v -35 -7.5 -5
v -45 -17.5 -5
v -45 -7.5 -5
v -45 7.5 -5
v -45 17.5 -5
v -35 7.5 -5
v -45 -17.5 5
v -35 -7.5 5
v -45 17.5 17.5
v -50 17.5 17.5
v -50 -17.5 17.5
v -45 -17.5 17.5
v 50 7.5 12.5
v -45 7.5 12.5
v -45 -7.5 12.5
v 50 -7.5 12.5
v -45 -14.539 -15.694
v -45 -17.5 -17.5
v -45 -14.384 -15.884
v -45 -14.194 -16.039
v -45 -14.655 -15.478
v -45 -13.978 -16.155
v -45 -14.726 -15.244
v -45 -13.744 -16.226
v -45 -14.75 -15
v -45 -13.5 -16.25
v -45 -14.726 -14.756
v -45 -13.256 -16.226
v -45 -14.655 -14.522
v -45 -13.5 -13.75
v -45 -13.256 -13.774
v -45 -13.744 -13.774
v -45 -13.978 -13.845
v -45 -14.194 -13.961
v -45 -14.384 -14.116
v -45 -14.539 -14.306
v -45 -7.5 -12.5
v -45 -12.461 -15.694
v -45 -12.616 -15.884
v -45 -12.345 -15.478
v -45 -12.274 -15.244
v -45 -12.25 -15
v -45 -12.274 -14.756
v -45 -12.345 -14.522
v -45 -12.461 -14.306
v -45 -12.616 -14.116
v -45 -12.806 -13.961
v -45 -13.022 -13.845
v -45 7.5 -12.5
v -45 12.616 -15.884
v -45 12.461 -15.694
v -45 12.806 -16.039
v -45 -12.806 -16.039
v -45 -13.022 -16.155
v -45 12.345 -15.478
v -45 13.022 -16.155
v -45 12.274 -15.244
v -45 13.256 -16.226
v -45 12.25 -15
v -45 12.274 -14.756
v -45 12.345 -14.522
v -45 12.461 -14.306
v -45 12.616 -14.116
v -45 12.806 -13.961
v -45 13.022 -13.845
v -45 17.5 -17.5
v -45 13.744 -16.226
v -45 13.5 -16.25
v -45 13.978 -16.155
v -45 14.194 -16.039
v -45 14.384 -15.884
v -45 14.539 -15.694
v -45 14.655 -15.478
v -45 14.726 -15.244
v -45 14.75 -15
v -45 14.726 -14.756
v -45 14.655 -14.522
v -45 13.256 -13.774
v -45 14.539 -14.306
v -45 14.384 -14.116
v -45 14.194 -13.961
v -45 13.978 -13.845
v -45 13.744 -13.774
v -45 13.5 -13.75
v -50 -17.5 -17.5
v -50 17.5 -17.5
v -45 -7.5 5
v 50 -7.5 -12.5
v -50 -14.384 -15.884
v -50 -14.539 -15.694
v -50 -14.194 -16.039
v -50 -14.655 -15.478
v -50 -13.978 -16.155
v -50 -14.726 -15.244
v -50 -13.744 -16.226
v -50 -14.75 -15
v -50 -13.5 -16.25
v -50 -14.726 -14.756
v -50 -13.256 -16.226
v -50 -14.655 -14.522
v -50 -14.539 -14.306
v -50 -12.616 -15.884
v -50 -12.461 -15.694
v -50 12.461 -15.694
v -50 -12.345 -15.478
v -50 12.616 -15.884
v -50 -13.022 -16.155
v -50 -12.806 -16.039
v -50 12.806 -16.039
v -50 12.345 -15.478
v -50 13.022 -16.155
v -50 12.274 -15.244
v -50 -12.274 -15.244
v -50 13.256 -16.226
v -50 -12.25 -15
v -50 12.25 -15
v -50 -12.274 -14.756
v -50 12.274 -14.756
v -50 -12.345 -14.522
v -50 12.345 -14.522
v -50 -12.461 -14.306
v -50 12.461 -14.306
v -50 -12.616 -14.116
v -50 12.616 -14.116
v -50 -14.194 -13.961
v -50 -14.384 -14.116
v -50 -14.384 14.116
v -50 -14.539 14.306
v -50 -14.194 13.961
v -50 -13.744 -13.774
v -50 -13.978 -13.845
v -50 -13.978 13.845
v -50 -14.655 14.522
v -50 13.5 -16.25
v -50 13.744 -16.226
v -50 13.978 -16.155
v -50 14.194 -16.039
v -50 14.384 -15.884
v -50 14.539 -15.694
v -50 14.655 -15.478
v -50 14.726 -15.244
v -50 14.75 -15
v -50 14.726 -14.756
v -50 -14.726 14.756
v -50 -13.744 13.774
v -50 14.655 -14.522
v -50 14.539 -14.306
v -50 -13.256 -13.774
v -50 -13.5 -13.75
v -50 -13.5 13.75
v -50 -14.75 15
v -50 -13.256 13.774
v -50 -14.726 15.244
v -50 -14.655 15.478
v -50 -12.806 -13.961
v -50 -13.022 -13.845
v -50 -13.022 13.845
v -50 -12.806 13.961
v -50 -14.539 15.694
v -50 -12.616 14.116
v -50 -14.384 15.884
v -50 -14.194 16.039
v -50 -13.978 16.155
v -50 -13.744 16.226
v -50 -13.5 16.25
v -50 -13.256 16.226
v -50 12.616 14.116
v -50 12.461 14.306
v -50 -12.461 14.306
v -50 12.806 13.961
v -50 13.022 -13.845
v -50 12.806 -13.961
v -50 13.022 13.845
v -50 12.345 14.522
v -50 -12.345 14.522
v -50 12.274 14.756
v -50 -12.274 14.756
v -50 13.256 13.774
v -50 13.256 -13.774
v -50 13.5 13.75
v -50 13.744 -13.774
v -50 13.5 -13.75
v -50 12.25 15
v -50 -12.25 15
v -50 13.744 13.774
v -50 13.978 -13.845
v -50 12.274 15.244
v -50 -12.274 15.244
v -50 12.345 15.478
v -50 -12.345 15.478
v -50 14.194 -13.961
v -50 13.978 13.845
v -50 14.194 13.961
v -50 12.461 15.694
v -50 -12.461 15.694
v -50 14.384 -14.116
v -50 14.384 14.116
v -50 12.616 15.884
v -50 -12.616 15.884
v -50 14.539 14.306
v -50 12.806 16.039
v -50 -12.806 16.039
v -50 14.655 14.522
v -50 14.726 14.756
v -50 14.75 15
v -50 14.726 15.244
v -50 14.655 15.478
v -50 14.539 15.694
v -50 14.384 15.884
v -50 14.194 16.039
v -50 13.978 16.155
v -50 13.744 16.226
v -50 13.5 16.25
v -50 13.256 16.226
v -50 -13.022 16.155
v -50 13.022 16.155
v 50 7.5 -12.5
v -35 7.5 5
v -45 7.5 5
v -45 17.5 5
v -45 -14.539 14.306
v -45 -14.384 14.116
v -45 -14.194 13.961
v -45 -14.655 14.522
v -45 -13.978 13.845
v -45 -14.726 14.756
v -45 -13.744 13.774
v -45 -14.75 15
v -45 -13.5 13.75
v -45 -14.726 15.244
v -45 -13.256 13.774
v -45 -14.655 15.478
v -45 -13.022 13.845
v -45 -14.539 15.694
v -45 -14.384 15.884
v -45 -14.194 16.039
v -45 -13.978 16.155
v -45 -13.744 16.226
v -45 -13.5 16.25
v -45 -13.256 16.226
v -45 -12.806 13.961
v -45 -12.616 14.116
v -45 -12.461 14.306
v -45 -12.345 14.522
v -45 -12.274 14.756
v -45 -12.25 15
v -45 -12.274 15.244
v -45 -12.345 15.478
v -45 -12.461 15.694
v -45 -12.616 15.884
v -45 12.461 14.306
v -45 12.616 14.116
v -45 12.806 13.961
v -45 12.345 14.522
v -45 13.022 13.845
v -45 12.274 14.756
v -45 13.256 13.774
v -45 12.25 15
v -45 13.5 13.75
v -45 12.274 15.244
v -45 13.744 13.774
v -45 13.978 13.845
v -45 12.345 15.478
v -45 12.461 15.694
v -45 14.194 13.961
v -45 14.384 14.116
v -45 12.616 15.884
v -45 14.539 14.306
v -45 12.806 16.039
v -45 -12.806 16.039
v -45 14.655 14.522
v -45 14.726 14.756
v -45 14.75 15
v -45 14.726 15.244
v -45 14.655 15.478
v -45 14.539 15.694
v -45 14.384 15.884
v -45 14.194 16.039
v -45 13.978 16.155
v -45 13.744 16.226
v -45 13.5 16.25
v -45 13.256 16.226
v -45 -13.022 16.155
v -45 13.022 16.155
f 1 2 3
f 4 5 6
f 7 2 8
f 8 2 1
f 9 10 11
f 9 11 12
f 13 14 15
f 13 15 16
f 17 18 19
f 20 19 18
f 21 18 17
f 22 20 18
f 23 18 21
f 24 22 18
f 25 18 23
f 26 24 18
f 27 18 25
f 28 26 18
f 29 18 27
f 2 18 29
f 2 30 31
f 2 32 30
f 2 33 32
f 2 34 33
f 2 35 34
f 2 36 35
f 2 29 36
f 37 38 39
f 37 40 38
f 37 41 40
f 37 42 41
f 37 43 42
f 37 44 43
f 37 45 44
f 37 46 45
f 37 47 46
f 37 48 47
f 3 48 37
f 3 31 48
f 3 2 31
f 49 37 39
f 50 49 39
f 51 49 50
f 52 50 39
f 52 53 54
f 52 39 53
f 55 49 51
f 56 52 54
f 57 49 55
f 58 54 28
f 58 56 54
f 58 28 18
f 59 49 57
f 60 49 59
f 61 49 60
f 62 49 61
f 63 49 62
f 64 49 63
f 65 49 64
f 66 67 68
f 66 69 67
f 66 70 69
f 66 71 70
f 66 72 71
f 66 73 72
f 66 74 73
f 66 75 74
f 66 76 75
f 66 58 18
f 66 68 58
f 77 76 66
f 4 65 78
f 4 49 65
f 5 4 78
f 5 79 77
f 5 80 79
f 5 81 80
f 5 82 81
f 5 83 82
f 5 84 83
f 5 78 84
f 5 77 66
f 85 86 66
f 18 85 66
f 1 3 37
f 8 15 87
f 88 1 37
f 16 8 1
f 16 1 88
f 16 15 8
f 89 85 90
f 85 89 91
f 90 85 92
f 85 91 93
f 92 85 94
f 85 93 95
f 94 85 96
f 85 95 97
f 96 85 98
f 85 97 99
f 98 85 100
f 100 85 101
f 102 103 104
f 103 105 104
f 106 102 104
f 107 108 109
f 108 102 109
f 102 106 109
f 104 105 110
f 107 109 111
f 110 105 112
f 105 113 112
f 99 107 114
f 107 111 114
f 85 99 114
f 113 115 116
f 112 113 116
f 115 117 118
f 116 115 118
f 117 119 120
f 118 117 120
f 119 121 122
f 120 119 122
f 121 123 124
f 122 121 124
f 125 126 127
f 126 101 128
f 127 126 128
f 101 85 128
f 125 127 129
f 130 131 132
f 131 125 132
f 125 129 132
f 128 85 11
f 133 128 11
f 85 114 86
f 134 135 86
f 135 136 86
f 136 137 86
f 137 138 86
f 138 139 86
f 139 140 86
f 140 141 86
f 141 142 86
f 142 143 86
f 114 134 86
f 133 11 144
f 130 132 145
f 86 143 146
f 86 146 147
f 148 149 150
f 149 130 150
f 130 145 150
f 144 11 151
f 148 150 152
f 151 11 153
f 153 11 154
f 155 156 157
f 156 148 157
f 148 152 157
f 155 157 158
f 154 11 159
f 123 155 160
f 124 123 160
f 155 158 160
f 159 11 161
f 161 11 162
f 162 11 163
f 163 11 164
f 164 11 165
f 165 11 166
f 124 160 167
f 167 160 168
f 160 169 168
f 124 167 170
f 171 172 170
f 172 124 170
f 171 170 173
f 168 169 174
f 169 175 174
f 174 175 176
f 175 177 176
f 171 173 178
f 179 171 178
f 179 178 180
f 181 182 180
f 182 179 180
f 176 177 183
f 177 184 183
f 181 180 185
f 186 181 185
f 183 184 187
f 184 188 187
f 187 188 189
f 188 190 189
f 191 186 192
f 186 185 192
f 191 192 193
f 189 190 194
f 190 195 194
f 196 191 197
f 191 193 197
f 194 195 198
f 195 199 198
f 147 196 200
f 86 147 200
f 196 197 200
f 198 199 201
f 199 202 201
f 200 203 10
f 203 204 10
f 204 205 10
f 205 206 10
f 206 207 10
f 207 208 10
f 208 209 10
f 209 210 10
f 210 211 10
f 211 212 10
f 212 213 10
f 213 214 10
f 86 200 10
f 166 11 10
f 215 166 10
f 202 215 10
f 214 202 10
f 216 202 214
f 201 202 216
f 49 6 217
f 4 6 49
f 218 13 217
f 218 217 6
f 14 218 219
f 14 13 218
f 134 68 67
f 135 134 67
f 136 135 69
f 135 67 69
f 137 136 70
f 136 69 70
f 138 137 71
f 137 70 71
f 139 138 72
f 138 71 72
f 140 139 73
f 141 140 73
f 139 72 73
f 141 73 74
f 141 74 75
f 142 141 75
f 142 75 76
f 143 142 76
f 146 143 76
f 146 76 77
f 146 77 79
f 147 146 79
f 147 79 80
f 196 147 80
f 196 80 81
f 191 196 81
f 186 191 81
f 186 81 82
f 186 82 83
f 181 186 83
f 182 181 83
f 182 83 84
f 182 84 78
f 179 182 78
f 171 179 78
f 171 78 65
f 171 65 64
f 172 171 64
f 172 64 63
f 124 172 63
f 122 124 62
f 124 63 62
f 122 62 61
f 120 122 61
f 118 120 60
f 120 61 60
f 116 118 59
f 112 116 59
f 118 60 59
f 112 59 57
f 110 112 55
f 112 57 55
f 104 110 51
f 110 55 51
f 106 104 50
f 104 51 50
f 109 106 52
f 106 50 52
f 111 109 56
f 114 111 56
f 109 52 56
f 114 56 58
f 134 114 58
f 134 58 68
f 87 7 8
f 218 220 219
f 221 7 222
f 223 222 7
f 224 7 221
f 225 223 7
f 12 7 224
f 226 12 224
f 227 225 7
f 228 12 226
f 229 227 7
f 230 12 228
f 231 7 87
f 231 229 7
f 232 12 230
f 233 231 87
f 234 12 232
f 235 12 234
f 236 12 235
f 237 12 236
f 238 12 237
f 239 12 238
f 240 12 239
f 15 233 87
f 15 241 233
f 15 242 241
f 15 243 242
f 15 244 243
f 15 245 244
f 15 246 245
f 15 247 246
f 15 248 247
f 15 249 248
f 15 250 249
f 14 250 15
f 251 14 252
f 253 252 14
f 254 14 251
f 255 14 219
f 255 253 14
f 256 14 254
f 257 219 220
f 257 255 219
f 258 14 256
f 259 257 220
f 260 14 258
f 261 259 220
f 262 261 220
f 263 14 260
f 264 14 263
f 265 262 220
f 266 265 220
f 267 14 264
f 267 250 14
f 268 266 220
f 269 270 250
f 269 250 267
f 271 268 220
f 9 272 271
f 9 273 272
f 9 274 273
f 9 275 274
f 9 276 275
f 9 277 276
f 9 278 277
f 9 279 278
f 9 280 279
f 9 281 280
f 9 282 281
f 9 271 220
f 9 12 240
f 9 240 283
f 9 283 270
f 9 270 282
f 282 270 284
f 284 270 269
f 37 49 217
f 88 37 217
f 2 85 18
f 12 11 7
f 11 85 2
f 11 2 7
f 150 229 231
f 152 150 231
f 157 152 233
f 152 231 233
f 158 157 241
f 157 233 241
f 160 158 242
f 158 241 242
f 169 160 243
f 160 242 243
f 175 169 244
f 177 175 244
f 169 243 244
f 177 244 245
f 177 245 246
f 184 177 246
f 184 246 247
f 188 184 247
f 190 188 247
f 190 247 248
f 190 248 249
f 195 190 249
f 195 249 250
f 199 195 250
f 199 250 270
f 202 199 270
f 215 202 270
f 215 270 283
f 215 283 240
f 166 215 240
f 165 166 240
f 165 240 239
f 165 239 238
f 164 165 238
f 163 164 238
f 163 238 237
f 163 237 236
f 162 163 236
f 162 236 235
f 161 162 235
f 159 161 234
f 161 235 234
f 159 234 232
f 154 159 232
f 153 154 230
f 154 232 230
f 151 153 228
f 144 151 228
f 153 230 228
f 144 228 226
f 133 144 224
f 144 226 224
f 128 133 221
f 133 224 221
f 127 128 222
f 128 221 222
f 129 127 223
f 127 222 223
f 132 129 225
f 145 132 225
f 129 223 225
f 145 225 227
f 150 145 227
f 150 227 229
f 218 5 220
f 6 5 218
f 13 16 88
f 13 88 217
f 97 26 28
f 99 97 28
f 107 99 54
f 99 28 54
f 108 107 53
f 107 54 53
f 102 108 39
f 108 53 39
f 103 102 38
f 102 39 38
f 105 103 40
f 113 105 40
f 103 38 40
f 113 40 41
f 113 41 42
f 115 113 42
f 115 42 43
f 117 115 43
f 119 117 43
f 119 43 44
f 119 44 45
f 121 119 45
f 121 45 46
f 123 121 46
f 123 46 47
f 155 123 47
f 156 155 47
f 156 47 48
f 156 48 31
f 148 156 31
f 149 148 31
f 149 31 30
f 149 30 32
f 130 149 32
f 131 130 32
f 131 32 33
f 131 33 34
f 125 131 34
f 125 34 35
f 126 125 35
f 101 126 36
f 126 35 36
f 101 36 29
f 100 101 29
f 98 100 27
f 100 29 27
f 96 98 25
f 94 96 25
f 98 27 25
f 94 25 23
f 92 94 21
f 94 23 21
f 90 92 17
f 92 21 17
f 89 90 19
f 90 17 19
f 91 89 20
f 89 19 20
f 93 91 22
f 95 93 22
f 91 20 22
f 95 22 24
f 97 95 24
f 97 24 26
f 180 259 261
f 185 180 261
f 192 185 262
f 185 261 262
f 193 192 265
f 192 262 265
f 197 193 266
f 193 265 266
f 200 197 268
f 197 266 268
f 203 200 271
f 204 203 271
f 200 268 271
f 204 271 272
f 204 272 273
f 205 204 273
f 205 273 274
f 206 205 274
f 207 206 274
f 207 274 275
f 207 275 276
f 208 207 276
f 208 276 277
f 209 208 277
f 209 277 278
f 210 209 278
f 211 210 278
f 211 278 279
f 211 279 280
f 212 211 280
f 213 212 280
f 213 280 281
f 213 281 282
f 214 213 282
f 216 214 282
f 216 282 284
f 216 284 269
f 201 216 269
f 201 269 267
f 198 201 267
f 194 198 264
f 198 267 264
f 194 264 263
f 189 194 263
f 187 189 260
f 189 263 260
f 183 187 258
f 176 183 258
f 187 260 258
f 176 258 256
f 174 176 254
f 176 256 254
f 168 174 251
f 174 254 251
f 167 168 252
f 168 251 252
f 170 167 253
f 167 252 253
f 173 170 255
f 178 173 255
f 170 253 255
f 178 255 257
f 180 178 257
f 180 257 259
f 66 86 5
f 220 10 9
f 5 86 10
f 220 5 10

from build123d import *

# Parameters (mm, degrees)
BOSS_EXTRUDE1_DEPTH         = 12.5
SKETCH2_W                   = 5
SKETCH2_H                   = 35
BOSS_EXTRUDE2_DEPTH         = 17.5
TAP_DRILL_FOR_M3X0_5_TAP1_D = 2.5
RIB1_REACH                  = 57.79
SKETCH5_WALL_W              = 127.721703646
SKETCH5_WALL_H              = 10
RIB6_REACH                  = 57.79
SKETCH7_WALL_W              = 127.721703646
SKETCH7_WALL_H              = 10


with BuildPart() as part:
    # Sketch1 → Boss-Extrude1 (new, symmetric)
    with BuildSketch(Plane.XY):
        Polygon((-50, 17.5), (-50, -17.5), (-45, -17.5), (-45, -7.5), (50, -7.5), (50, 7.5), (-45, 7.5), (-45, 17.5), align=None)
    extrude(amount=BOSS_EXTRUDE1_DEPTH, both=True)

    # Sketch2 → Boss-Extrude2 (add, symmetric)
    with BuildSketch(Plane.XY):
        with Locations((-47.5, 0)):
            Rectangle(SKETCH2_W, SKETCH2_H)
    extrude(amount=BOSS_EXTRUDE2_DEPTH, both=True)

    # Tap Drill for M3x0.5 Tap1 (through all)
    with Locations(Plane.ZY.offset(50)):
        with Locations((-15, 13.5), (15, 13.5), (15, -13.5), (-15, -13.5)):
            Hole(TAP_DRILL_FOR_M3X0_5_TAP1_D / 2)

    # Sketch5 wall → Rib1 (add, up to next)
    with BuildSketch(Plane(origin=(-40, 12.5, 0), x_dir=(0.707106781187, -0.707106781187, 0), z_dir=(0.707106781187, 0.707106781187, 0)), mode=Mode.PRIVATE) as rib1_sk1:
        Rectangle(SKETCH5_WALL_W, SKETCH5_WALL_H)
    rib1_tool1 = extrude(rib1_sk1.sketch, amount=-RIB1_REACH, mode=Mode.PRIVATE) - part.part
    add(rib1_tool1.solids().sort_by_distance((-40, 12.5, 0))[0])

    # Sketch7 wall → Rib6 (add, up to next)
    with BuildSketch(Plane(origin=(-40, -12.5, 0), x_dir=(0.707106781187, 0.707106781187, 0), z_dir=(-0.707106781187, 0.707106781187, 0)), mode=Mode.PRIVATE) as rib6_sk1:
        Rectangle(SKETCH7_WALL_W, SKETCH7_WALL_H)
    rib6_tool1 = extrude(rib6_sk1.sketch, amount=RIB6_REACH, mode=Mode.PRIVATE) - part.part
    add(rib6_tool1.solids().sort_by_distance((-40, -12.5, 0))[0])


solid = part.part
